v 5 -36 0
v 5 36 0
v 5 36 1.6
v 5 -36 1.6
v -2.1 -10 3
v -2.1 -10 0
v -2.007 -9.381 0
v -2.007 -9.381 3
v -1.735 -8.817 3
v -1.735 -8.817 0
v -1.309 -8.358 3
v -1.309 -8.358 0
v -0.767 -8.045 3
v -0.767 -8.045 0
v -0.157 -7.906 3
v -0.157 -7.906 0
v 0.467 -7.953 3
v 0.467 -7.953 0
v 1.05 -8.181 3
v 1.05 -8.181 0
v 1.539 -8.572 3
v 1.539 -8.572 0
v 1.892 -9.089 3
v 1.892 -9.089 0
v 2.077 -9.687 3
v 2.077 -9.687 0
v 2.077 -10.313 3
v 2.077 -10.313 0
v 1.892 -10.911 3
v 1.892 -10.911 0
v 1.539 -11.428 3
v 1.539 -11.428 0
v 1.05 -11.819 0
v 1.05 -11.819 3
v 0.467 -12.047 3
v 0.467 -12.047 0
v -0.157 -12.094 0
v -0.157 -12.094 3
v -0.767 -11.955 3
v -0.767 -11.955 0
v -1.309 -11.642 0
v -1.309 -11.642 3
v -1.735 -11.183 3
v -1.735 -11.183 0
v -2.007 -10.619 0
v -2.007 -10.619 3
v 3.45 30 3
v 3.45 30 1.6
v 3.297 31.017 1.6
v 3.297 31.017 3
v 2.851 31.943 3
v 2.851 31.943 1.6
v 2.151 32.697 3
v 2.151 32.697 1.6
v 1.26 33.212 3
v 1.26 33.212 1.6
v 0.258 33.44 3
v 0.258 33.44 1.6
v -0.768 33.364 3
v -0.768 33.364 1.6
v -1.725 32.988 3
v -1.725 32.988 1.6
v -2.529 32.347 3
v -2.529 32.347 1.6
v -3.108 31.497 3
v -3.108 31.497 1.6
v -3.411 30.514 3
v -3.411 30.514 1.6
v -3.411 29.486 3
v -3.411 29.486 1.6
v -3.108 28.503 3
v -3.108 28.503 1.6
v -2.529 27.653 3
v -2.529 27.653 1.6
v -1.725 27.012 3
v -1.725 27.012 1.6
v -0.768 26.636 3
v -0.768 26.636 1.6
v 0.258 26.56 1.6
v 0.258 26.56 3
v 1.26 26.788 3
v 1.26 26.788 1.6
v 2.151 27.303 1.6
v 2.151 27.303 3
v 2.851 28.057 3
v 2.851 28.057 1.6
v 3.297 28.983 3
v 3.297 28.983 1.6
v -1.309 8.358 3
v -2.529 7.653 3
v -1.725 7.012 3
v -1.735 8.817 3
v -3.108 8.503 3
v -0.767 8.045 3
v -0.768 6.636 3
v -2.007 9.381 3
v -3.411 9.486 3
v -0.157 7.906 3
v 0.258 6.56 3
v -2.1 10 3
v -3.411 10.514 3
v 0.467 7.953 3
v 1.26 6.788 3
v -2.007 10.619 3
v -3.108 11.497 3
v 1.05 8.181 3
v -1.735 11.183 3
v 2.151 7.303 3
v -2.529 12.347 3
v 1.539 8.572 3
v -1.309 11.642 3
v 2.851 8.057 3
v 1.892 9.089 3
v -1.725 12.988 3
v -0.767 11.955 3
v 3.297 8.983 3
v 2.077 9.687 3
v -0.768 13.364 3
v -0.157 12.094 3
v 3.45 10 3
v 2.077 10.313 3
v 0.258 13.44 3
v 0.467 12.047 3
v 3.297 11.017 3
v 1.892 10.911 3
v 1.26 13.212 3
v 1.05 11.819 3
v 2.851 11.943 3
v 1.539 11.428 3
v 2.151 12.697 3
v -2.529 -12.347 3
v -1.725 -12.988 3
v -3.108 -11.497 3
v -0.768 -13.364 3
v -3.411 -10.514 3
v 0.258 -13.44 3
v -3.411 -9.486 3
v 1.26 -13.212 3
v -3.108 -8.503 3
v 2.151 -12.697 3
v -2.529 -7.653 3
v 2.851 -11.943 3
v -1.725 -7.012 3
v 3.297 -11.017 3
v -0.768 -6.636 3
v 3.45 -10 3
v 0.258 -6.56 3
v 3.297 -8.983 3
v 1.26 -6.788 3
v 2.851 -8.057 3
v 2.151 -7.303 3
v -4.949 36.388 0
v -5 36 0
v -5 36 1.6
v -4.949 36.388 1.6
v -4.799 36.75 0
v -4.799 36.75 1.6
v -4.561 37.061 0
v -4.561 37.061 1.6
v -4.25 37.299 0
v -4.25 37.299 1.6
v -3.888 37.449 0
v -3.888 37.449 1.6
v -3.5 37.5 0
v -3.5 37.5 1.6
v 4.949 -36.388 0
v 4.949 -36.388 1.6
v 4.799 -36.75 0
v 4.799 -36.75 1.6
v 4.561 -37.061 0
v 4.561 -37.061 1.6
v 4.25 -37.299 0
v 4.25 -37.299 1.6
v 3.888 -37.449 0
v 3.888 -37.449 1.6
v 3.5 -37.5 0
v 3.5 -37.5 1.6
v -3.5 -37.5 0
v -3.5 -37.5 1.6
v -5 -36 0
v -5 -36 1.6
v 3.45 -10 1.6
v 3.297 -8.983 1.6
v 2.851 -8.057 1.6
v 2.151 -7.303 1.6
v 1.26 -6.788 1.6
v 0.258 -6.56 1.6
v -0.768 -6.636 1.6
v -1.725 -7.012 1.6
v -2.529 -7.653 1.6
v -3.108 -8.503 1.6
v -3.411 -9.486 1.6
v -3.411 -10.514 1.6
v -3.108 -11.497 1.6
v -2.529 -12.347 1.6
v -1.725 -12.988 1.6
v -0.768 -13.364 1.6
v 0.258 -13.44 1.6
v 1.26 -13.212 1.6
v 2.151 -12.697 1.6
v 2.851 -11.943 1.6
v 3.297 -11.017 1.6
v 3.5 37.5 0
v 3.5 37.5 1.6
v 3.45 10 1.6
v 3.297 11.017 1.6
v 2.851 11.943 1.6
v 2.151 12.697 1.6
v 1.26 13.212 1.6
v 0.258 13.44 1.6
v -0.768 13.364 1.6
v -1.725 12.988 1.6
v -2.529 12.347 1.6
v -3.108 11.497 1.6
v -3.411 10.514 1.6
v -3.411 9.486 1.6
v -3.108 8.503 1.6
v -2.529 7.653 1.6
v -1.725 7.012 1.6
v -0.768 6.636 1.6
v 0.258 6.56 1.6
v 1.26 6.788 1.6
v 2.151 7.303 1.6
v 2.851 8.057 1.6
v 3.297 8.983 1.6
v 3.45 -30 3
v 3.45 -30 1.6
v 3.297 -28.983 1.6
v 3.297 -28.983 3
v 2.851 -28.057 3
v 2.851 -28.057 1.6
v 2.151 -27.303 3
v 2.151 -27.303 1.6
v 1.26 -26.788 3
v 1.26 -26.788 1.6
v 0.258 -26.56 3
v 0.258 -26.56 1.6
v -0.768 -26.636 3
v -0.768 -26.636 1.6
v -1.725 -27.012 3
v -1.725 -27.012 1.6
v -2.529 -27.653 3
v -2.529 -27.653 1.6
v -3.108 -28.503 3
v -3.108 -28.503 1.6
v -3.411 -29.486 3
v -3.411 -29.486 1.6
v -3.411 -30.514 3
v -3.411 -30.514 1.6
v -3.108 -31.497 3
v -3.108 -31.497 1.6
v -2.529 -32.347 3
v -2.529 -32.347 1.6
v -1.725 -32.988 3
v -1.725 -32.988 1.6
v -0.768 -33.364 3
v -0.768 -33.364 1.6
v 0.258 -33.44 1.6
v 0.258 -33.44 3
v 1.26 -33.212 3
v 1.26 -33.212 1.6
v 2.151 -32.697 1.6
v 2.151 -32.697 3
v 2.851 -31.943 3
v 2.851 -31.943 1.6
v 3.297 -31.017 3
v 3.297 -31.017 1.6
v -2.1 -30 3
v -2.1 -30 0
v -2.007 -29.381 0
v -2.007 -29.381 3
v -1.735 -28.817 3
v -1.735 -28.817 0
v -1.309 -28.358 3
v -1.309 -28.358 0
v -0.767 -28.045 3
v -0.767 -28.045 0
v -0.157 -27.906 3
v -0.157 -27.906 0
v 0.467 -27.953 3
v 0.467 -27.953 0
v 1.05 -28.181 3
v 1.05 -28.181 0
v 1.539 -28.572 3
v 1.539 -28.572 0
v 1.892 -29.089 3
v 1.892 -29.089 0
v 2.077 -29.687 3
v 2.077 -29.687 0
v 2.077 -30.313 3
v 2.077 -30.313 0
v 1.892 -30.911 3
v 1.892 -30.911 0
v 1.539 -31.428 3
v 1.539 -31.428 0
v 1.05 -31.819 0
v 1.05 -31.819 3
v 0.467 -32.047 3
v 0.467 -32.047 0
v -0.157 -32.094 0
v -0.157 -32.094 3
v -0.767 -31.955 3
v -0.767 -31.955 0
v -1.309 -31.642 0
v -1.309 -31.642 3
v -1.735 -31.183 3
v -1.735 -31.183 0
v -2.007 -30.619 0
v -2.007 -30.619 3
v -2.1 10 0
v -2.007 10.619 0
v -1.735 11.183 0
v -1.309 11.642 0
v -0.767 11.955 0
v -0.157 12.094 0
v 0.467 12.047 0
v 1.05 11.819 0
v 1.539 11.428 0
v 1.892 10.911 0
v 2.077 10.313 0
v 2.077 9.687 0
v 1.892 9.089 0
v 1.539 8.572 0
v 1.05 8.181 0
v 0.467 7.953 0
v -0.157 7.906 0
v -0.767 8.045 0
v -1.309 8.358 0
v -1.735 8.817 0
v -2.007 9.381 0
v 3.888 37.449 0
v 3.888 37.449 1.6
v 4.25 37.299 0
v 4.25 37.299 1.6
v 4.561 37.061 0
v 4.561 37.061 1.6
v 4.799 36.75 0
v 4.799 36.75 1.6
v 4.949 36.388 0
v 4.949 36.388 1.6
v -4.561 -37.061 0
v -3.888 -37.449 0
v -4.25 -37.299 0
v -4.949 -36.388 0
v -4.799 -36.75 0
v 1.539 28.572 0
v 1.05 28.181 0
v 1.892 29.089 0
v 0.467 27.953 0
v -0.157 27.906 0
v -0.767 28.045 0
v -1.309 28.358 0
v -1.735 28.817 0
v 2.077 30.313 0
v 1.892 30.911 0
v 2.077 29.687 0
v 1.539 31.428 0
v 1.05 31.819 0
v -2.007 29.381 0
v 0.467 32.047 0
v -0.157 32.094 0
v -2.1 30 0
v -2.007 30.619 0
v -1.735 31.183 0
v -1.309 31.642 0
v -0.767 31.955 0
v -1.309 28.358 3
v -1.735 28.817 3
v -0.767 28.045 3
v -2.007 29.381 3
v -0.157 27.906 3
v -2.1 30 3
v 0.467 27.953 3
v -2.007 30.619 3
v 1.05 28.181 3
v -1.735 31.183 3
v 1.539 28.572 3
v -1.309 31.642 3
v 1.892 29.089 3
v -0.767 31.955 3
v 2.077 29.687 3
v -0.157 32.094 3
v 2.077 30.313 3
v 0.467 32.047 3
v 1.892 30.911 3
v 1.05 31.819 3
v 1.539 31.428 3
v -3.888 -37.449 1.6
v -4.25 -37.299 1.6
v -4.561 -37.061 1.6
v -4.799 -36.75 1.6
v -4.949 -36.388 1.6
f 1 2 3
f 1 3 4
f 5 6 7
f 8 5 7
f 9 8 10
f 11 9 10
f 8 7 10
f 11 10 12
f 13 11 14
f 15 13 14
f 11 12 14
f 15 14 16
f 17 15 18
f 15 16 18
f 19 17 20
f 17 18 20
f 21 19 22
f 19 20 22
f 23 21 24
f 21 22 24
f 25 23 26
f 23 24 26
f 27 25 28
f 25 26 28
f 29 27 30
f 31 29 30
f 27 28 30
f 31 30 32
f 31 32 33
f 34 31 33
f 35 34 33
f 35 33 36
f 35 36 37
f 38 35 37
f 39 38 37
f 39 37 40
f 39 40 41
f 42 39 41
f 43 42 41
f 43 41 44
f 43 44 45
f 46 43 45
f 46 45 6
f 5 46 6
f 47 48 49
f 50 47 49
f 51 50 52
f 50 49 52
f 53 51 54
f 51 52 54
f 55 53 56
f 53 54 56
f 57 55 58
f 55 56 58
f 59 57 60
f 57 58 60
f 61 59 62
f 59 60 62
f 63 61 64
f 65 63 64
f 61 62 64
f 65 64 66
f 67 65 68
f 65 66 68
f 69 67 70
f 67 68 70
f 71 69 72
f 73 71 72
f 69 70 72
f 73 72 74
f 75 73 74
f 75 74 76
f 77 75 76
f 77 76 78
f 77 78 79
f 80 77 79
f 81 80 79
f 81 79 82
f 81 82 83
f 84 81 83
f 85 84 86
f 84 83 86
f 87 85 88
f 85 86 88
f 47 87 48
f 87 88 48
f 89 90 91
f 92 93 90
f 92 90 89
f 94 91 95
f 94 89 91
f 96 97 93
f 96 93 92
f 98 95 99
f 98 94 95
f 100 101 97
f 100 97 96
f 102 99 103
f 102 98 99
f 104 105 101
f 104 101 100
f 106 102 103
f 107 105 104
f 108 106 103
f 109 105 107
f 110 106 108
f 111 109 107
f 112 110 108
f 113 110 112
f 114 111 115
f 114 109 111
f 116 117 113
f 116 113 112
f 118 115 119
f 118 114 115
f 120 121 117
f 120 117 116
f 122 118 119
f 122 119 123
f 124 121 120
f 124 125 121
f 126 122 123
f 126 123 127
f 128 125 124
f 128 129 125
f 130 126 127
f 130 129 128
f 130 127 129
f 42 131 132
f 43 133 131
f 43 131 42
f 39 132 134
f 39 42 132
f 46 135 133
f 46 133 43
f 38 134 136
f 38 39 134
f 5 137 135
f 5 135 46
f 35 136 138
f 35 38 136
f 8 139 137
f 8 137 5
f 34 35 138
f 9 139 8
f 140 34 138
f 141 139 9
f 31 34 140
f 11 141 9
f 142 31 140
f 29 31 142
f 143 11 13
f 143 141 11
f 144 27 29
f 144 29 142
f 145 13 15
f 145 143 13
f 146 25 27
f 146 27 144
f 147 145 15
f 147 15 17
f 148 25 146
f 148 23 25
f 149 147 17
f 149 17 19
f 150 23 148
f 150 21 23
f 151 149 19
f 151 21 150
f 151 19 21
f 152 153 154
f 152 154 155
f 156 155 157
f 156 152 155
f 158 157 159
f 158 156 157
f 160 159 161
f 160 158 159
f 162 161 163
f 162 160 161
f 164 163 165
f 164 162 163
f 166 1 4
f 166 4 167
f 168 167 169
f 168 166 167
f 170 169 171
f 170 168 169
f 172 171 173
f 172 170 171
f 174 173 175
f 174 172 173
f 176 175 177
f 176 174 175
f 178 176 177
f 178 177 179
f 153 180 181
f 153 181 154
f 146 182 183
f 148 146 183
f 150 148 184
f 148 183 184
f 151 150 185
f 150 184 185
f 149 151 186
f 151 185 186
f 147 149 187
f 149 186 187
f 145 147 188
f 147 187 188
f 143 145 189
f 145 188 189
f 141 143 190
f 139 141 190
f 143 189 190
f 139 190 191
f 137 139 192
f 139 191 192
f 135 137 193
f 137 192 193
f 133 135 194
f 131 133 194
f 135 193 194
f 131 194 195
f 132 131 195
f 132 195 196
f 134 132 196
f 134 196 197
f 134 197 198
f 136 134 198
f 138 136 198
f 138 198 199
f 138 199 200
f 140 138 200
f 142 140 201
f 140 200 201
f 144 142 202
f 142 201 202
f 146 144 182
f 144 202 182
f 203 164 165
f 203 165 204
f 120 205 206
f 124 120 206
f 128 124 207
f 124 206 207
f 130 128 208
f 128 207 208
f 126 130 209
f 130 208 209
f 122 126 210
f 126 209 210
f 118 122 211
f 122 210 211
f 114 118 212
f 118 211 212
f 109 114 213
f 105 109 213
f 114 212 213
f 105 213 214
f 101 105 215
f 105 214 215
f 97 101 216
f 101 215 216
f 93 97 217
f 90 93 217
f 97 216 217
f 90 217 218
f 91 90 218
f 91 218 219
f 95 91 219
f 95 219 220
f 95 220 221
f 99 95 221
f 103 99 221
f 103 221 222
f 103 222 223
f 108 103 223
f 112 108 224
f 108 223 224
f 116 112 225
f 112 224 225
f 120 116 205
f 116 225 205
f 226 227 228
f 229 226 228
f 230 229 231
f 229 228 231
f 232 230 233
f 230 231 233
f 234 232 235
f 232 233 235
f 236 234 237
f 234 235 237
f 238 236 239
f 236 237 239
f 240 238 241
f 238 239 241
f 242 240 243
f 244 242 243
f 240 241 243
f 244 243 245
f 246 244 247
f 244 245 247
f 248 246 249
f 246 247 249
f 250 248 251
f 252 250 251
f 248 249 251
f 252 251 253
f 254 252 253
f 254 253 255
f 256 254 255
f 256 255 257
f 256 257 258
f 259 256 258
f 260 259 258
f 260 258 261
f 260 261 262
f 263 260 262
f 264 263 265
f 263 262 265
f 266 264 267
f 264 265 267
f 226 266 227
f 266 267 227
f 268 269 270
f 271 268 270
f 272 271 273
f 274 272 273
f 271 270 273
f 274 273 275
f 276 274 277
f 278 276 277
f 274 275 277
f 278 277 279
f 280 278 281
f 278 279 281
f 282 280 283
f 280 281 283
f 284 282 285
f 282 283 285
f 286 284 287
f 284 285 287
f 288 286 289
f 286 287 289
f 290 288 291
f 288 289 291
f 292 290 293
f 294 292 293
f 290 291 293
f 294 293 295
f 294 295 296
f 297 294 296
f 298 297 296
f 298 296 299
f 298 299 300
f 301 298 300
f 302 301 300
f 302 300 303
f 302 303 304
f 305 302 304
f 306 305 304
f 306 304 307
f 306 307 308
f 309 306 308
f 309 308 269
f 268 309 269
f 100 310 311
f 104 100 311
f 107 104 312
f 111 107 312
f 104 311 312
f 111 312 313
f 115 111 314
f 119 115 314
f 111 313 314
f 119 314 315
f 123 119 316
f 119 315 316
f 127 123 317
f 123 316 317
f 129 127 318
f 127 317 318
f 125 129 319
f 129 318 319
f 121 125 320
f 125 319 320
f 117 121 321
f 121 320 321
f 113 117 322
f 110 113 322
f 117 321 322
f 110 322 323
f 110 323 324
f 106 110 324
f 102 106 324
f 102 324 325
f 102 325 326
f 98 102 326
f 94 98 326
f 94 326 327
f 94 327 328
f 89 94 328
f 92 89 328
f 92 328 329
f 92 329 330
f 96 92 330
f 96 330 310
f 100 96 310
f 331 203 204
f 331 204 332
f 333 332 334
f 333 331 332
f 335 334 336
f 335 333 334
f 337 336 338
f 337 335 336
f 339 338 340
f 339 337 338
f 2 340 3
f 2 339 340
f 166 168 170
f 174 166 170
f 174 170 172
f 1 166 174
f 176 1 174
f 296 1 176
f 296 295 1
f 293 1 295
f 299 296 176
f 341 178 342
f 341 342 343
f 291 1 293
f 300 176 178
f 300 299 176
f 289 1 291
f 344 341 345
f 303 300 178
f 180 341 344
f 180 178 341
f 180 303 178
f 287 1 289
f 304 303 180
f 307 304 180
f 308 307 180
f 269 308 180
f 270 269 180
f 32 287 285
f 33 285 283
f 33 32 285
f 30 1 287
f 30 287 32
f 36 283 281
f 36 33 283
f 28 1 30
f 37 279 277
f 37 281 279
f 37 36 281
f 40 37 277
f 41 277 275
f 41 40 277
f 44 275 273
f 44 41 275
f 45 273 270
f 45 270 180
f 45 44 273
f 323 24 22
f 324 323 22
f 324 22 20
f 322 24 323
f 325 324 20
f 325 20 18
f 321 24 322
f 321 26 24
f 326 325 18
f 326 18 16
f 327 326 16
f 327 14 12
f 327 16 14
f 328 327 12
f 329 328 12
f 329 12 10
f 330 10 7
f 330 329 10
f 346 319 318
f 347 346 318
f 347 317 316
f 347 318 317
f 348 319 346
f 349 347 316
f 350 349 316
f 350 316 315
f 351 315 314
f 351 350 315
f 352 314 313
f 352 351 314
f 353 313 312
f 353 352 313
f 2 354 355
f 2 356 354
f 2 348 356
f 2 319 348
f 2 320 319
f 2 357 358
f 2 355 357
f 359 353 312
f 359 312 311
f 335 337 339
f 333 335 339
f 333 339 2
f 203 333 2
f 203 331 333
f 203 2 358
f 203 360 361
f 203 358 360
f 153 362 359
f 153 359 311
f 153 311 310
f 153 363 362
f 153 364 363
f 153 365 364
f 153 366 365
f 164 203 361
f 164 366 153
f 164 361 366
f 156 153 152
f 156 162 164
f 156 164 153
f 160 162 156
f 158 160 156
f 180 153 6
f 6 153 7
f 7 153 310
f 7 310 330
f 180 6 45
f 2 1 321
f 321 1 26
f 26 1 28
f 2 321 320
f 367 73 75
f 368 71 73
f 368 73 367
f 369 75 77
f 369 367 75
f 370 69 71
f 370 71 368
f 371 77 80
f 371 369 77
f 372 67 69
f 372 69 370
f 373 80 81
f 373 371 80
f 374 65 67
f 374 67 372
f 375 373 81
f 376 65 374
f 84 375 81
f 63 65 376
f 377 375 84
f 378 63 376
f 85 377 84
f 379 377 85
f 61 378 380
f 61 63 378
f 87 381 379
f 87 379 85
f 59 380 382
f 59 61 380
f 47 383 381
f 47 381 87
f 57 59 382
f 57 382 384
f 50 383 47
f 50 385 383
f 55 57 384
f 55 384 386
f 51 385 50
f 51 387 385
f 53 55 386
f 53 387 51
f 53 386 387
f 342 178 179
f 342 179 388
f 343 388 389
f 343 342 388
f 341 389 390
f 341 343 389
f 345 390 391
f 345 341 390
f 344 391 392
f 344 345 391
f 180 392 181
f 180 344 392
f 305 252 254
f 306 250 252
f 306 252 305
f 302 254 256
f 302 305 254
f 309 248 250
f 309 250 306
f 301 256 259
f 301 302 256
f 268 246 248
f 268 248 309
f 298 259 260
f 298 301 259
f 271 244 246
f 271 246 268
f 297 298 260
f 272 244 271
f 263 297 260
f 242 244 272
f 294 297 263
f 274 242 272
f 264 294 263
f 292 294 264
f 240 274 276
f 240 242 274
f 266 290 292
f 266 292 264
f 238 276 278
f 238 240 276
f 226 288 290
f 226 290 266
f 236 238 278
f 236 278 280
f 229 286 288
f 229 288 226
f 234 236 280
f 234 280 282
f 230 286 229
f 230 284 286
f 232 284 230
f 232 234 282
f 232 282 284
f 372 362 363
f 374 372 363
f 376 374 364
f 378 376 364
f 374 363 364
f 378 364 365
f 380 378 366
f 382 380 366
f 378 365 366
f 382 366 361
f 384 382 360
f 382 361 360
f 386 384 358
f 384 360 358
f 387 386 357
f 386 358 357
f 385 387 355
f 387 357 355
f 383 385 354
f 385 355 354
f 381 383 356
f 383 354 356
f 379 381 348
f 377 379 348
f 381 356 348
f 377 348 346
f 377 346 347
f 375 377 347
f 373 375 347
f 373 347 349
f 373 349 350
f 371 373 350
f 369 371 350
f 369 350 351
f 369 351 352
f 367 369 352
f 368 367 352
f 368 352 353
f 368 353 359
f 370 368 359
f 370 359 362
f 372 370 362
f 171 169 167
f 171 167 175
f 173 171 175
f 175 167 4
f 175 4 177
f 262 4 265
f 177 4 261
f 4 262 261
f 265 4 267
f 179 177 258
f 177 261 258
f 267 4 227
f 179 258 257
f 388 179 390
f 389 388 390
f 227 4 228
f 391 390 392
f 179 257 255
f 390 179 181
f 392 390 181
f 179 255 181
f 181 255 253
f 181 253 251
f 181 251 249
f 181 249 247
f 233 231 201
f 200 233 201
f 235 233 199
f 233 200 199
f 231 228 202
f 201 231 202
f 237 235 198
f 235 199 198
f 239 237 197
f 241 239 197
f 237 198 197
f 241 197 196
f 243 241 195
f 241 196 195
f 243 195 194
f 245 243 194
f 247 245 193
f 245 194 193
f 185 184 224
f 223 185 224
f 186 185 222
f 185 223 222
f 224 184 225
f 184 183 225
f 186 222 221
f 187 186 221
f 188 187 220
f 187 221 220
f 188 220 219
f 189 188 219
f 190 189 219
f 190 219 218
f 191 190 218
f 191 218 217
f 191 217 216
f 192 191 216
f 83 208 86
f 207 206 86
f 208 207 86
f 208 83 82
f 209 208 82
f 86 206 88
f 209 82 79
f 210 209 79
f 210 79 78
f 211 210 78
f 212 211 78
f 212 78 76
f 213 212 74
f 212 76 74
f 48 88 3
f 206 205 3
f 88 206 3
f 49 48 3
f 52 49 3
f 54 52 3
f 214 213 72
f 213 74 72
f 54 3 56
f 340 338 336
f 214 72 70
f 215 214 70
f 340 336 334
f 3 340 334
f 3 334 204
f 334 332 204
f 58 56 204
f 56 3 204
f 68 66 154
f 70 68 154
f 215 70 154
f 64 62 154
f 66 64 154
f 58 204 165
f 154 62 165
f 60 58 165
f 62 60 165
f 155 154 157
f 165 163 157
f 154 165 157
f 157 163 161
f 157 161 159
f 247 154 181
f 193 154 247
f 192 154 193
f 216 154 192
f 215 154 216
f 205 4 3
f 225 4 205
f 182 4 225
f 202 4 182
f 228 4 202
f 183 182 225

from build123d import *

# Parameters (mm, degrees)
BOSS_EXTRUDE1_DEPTH   = 1.6
SKETCH2_R             = 3.45
BOSS_EXTRUDE2_DEPTH   = 1.4
M5X0_8_TAPPED_HOLE1_D = 4.2


with BuildPart() as part:
    # Sketch1 → Boss-Extrude1 (new body)
    with BuildSketch(Plane.XY):
        with BuildLine():
            Line((3.5, -37.5), (-3.5, -37.5))
            ThreePointArc((-3.5, -37.5), (-4.560660172, -37.060660172), (-5, -36))
            Line((-5, -36), (-5, 36))
            ThreePointArc((-5, 36), (-4.560660172, 37.060660172), (-3.5, 37.5))
            Line((-3.5, 37.5), (3.5, 37.5))
            ThreePointArc((3.5, 37.5), (4.560660172, 37.060660172), (5, 36))
            Line((5, 36), (5, -36))
            ThreePointArc((5, -36), (4.560660172, -37.060660172), (3.5, -37.5))
        make_face()
    extrude(amount=BOSS_EXTRUDE1_DEPTH)

    # Sketch2 → Boss-Extrude2 (add)
    with BuildSketch(Plane.XY.offset(1.6)):
        with Locations((0, 10)):
            Circle(SKETCH2_R)
        with Locations((0, 30)):
            Circle(SKETCH2_R)
        with Locations((0, -10)):
            Circle(SKETCH2_R)
        with Locations((0, -30)):
            Circle(SKETCH2_R)
    extrude(amount=BOSS_EXTRUDE2_DEPTH)

    # M5x0.8 Tapped Hole1 (through all)
    with Locations(Plane.XY.offset(3)):
        with Locations((0, 30), (0, 10), (0, -10), (0, -30)):
            Hole(M5X0_8_TAPPED_HOLE1_D / 2)


solid = part.part
